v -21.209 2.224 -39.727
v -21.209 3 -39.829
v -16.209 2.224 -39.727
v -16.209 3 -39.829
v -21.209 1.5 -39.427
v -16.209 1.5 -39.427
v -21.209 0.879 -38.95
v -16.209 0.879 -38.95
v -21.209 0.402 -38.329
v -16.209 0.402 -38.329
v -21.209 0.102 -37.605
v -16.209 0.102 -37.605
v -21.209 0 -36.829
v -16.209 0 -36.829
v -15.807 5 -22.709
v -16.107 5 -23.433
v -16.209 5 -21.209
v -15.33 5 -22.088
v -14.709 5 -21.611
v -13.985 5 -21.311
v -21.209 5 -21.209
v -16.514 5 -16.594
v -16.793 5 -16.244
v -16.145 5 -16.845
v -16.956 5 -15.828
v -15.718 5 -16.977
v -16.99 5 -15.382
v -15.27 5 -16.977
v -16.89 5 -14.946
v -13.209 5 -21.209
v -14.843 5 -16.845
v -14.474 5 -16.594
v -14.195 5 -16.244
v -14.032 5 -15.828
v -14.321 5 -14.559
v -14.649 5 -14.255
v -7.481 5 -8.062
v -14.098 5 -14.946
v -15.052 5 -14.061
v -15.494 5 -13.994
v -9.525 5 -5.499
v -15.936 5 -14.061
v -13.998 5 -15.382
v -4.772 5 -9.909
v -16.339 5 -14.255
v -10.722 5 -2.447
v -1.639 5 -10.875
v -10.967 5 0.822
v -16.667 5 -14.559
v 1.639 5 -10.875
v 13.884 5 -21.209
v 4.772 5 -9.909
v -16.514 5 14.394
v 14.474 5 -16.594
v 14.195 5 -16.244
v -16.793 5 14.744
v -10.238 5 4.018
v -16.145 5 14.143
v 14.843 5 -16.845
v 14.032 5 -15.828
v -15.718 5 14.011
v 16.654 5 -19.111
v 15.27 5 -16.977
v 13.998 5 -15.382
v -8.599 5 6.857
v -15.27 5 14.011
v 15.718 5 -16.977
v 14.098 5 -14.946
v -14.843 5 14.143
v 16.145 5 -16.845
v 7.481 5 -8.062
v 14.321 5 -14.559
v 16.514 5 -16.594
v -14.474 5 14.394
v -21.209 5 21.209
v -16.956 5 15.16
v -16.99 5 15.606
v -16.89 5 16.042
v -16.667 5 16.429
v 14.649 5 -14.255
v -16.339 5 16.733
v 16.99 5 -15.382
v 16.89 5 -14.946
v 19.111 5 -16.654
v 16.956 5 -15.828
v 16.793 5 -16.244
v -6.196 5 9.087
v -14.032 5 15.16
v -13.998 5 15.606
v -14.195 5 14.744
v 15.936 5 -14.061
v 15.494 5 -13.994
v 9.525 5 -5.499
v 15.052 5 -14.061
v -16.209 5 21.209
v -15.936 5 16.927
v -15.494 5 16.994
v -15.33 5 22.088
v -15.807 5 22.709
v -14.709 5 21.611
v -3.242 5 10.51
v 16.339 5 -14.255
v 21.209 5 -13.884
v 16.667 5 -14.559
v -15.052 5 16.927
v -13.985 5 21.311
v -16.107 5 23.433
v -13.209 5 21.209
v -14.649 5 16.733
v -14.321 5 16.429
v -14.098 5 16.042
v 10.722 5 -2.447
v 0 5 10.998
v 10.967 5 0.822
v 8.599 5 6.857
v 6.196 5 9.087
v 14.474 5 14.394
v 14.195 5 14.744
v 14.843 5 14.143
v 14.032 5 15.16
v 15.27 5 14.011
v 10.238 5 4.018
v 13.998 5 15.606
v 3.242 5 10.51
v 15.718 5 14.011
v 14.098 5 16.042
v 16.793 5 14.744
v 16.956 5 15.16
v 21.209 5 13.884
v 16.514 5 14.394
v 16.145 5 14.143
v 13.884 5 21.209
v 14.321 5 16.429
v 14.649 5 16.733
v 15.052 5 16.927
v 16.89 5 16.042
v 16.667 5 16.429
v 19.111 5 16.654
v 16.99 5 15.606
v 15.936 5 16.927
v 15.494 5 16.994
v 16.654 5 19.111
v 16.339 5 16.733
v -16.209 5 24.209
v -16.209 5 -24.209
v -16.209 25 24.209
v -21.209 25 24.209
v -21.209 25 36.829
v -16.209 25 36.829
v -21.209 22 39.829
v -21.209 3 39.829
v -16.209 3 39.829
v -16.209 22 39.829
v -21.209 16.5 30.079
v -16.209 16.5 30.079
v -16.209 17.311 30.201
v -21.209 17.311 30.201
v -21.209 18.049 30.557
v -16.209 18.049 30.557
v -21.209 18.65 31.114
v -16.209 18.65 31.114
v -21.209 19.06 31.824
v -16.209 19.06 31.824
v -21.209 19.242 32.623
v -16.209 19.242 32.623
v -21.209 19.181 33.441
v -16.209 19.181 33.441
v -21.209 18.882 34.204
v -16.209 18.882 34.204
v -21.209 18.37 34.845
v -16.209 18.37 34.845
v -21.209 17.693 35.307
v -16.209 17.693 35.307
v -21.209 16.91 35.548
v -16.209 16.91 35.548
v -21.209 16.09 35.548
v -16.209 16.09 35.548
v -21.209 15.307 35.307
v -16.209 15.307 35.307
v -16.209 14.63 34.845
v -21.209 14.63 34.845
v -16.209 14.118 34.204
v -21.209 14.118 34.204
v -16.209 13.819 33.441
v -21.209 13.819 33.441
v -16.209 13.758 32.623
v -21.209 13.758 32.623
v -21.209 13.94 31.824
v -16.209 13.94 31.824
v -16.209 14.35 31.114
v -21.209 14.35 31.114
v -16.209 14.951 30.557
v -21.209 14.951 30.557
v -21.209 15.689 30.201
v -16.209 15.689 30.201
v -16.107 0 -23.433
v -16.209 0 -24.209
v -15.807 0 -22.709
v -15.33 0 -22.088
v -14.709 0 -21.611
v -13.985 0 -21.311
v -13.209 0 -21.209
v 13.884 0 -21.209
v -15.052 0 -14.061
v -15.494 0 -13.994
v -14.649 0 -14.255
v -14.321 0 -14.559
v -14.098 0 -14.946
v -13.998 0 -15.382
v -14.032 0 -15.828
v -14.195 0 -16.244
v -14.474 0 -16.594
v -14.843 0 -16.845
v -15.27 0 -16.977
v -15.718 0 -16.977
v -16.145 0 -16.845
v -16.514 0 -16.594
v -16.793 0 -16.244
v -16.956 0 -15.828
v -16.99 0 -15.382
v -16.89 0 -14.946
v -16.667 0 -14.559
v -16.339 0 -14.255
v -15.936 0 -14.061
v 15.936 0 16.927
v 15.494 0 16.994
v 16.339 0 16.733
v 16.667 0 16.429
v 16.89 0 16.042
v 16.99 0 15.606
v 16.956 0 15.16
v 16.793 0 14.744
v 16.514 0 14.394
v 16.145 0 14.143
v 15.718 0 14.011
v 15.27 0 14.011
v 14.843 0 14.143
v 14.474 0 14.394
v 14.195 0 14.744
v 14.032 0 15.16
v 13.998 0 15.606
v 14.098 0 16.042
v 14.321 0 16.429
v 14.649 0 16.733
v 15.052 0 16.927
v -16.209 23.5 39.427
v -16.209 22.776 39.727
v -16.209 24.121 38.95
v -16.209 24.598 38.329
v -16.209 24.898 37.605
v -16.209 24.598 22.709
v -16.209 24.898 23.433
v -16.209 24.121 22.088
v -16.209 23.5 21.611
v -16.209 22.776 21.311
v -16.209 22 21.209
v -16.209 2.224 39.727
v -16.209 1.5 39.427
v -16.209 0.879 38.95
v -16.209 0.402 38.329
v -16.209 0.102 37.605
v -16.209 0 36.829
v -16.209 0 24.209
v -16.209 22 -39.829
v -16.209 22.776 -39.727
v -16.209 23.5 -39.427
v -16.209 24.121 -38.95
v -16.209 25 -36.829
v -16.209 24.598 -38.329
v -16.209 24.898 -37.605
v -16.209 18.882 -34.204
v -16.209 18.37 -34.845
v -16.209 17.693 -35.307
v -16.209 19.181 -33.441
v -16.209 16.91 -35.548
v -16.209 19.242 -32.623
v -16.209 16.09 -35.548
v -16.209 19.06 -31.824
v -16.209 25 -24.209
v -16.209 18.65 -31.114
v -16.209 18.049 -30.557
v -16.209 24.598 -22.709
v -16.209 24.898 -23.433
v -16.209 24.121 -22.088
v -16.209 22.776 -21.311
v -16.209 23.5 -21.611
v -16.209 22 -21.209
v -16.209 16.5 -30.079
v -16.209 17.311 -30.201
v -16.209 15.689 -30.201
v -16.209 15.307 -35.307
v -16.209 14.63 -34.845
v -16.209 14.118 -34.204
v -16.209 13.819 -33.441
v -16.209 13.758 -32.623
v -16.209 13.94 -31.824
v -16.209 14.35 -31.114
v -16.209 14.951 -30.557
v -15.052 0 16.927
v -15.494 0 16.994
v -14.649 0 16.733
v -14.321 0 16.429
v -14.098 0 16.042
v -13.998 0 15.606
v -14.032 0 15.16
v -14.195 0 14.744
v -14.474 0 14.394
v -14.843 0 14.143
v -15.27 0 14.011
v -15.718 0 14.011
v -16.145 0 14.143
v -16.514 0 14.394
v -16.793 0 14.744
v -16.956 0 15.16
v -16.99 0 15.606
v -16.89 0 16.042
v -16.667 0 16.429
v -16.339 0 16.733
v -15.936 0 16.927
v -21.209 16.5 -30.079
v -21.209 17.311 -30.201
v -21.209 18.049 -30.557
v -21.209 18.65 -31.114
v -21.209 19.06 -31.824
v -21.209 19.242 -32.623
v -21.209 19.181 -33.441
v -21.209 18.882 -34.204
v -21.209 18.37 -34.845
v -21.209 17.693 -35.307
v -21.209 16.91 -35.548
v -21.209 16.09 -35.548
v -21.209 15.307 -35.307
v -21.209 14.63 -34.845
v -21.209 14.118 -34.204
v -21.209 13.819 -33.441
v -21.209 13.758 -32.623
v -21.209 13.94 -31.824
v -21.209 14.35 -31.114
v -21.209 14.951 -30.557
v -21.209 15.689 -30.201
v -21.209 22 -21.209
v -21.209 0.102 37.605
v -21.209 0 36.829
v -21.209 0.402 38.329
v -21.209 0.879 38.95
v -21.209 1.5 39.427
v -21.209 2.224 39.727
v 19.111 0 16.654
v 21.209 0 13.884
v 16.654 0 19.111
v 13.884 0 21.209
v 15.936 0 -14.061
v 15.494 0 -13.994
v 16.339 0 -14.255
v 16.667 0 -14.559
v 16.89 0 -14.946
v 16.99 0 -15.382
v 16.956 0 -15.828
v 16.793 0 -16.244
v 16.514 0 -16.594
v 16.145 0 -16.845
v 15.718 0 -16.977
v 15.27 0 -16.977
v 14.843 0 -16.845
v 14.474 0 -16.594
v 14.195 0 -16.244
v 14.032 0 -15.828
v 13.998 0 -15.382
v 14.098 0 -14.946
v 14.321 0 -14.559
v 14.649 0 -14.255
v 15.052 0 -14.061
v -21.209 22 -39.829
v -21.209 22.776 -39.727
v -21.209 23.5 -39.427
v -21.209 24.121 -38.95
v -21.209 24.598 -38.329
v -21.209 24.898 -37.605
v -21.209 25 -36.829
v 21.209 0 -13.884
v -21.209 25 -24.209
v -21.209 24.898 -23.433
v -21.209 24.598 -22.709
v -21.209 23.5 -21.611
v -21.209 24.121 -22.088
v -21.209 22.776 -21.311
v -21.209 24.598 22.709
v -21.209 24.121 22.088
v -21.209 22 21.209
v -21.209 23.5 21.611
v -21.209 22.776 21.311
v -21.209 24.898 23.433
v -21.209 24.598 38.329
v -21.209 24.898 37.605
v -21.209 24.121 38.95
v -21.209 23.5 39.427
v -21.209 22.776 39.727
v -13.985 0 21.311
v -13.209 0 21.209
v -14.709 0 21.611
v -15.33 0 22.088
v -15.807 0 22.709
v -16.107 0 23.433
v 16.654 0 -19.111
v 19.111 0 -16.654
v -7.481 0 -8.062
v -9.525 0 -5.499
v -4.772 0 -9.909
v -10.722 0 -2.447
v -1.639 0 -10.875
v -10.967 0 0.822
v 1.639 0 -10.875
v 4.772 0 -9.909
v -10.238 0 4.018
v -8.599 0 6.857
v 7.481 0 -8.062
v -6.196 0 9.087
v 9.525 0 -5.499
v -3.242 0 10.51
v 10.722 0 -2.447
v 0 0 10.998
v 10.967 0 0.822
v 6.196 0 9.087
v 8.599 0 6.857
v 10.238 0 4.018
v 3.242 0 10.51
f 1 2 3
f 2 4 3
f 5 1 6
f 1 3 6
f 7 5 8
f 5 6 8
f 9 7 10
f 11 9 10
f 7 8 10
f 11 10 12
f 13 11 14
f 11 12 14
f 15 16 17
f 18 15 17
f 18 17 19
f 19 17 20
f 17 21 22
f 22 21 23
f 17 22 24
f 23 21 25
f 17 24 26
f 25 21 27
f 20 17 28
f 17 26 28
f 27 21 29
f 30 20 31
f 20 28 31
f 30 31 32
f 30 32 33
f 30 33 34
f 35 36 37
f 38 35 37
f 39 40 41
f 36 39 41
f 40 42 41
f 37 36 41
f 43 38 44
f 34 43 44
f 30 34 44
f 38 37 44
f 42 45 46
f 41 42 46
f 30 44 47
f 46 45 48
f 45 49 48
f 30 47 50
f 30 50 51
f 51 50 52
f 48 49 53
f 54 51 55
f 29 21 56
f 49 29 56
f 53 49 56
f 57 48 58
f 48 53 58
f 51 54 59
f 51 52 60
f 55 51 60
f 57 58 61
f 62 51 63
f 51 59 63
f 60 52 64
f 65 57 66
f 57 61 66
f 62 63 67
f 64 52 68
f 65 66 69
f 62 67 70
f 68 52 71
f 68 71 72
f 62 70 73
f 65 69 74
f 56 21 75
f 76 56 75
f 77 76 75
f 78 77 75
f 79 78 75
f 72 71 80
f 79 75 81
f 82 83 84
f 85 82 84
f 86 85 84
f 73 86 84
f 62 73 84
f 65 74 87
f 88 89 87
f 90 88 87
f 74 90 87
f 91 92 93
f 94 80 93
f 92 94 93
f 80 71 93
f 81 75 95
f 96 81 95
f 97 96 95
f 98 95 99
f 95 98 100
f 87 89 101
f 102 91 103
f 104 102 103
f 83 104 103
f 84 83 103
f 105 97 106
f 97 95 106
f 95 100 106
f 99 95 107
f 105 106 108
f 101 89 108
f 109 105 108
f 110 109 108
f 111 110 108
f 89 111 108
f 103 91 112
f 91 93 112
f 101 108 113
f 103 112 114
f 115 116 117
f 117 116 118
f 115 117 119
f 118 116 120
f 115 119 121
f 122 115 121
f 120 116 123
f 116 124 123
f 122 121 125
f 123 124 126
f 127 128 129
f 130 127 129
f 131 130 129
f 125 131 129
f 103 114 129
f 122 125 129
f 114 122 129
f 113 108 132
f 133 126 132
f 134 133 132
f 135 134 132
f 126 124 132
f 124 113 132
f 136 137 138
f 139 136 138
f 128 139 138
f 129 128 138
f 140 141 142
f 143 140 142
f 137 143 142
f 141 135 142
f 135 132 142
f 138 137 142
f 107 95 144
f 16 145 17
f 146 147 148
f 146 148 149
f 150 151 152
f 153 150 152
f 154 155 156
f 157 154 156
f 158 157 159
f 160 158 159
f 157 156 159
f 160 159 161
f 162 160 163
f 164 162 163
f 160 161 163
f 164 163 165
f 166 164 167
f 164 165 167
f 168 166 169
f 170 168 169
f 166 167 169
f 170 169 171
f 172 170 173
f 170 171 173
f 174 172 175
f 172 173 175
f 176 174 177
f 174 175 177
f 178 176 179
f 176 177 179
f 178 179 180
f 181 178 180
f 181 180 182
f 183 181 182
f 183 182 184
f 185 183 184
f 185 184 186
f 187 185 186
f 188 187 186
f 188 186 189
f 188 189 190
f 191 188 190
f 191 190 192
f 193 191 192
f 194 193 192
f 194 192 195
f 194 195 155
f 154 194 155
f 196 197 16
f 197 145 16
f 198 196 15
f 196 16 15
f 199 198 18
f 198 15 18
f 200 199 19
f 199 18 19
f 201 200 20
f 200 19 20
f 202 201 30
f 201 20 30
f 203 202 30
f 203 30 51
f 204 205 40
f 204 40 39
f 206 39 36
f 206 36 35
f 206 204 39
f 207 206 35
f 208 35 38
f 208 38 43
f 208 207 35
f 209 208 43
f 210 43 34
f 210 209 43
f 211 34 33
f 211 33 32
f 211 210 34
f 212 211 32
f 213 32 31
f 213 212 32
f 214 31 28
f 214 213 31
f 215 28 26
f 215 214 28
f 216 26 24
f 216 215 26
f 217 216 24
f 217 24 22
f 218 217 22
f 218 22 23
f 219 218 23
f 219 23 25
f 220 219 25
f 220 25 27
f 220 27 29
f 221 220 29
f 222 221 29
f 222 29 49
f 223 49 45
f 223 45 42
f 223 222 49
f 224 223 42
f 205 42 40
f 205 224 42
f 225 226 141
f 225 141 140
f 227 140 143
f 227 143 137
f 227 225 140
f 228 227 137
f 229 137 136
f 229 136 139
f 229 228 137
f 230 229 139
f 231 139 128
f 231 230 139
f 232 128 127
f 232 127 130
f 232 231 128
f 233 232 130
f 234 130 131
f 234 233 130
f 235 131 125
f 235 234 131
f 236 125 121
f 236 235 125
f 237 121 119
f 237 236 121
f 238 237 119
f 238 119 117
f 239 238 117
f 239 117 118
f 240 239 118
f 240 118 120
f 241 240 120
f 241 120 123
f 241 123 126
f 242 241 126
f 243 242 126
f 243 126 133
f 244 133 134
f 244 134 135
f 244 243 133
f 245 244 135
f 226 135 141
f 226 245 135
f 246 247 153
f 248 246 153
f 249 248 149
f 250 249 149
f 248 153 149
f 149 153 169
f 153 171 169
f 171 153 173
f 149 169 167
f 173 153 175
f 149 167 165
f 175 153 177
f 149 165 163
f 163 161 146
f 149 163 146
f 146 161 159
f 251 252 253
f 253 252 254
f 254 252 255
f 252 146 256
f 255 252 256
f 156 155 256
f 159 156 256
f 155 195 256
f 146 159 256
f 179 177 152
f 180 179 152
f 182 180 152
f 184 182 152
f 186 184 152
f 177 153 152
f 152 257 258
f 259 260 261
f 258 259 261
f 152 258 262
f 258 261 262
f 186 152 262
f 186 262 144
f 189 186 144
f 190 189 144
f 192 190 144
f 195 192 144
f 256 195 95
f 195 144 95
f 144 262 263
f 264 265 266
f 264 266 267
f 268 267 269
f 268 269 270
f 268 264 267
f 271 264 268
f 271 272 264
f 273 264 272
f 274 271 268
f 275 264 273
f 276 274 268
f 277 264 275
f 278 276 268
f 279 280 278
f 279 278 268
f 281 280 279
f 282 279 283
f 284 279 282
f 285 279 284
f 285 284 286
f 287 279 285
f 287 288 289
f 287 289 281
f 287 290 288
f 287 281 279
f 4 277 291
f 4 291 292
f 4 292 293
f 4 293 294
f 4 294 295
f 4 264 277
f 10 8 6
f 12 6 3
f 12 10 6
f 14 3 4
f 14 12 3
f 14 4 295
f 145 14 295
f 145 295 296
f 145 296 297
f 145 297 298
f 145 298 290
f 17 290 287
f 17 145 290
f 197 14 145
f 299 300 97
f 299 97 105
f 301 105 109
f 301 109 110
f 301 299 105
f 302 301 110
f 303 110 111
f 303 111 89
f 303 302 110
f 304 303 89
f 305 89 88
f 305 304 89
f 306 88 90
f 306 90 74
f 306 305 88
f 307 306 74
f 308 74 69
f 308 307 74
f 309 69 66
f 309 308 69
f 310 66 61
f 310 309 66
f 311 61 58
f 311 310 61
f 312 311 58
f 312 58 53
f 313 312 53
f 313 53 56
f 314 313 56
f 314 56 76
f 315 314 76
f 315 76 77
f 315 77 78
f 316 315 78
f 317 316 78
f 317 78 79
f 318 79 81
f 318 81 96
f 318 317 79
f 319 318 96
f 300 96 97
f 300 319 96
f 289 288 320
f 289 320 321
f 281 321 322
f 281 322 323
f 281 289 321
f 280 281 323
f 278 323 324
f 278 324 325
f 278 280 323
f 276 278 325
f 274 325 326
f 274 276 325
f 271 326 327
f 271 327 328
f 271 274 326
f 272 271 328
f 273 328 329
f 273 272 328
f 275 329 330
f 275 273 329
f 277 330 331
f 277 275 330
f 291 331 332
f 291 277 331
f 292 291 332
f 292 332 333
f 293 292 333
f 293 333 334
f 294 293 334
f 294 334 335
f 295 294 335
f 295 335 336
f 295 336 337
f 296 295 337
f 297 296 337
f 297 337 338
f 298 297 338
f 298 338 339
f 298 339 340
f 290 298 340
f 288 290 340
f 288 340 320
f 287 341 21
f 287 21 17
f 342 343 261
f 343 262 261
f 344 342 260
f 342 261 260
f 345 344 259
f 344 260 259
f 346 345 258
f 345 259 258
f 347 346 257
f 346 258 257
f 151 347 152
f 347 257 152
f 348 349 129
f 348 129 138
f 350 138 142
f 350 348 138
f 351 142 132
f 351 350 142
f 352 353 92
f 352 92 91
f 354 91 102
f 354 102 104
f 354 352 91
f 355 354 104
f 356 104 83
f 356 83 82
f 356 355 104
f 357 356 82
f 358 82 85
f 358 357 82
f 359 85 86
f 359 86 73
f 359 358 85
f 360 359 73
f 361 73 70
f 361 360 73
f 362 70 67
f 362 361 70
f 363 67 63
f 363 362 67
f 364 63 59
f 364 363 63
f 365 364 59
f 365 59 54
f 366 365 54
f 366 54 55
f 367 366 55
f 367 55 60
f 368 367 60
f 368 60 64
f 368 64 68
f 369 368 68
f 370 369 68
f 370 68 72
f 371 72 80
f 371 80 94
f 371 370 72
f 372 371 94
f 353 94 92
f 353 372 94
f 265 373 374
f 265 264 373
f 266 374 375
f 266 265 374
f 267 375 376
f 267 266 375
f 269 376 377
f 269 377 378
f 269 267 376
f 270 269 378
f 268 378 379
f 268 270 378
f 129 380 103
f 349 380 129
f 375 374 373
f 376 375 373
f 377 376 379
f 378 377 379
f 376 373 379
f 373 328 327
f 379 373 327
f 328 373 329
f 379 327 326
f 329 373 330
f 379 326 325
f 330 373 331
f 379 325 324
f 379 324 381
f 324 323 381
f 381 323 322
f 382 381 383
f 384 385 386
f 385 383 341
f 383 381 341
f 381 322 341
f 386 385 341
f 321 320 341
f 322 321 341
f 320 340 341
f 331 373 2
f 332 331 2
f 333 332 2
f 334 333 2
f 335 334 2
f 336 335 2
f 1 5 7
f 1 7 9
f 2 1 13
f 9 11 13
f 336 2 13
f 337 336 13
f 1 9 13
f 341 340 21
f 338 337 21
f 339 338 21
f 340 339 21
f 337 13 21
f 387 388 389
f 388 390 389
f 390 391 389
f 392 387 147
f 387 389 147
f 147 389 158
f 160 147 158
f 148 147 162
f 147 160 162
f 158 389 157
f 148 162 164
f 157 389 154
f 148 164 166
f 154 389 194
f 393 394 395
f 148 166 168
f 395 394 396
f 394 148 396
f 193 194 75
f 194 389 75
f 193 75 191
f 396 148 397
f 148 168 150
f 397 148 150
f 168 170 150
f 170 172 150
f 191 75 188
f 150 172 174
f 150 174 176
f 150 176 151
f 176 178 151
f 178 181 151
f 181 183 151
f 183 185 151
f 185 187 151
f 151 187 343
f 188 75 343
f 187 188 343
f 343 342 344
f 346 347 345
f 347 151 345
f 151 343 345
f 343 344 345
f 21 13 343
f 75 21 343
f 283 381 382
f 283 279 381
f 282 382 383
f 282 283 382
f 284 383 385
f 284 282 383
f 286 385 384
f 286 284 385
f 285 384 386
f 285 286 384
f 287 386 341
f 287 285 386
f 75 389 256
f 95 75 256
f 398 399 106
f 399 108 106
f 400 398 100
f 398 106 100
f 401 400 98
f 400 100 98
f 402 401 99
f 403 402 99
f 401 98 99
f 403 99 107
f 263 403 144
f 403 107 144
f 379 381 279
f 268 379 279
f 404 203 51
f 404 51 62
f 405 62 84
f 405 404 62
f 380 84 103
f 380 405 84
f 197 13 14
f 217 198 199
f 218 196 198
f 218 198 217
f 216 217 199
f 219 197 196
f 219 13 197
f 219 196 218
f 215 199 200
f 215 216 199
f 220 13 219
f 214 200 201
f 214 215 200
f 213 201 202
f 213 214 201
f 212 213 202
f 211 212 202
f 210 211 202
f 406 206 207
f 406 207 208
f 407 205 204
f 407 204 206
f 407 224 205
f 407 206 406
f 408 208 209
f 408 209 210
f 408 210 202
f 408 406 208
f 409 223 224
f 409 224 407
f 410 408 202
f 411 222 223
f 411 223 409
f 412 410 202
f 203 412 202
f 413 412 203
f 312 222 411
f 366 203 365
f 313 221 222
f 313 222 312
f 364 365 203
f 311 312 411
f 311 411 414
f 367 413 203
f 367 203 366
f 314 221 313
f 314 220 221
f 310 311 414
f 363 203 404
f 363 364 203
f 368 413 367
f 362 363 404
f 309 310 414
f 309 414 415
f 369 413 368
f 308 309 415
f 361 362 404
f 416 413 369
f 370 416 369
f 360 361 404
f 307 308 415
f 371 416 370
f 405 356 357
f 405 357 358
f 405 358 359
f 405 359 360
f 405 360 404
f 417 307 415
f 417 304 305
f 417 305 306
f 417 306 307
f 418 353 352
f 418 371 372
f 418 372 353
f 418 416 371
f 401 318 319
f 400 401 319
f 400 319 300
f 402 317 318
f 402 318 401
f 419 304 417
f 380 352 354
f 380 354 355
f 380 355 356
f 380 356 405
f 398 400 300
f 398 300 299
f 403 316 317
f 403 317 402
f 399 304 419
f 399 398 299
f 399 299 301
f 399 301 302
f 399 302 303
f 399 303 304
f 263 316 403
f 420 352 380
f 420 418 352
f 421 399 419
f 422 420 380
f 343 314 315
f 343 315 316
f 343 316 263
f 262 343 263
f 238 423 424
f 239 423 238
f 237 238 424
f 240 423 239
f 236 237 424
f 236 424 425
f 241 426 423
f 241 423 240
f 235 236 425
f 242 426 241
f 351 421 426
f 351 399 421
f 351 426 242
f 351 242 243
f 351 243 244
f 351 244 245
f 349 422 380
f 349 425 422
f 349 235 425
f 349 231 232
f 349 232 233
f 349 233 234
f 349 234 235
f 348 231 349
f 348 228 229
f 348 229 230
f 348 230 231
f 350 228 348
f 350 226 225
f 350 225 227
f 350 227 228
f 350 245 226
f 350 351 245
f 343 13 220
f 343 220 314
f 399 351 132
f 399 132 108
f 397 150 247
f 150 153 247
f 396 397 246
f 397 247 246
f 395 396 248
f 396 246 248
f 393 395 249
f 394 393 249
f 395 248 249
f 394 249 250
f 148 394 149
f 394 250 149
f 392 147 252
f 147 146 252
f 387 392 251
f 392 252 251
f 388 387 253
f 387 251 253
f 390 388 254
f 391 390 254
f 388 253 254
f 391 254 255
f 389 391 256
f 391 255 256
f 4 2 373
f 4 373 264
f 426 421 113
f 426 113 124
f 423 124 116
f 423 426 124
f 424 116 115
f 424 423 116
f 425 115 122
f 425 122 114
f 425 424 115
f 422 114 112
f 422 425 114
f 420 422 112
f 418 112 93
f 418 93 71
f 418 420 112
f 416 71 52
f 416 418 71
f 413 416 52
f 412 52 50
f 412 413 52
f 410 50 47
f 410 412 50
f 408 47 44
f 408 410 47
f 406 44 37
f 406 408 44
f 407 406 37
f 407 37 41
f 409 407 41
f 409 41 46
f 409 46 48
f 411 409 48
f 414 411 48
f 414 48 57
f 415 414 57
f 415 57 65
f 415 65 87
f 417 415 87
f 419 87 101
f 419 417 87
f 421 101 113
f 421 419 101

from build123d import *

# Parameters (mm, degrees)
BOSS_EXTRUDE1_DEPTH = 5
SKETCH3_R           = 1.5
SKETCH3_R_2         = 10.9982
CUT_EXTRUDE1_DEPTH  = 5
SKETCH5_W           = 5
SKETCH5_H           = 5
BOSS_EXTRUDE2_DEPTH = 18.62
SKETCH6_W           = 5
SKETCH6_H           = 18.62
BOSS_EXTRUDE3_DEPTH = 20
CUT_EXTRUDE2_REACH  = 62.095
SKETCH7_R           = 2.75
FILLET1_R           = 3


with BuildPart() as part:
    # Sketch1 → Boss-Extrude1 (new body)
    with BuildSketch(Plane(origin=(0, 0, 0), x_dir=(1, 0, 0), z_dir=(0, 1, 0))):
        with BuildLine():
            Line((-13.883812864, -21.209), (-21.209, -21.209))
            Line((-21.209, -21.209), (-21.209, -13.883812864))
            Line((-21.209, -13.883812864), (-21.209, 13.883812864))
            Line((-21.209, 13.883812864), (-21.209, 21.209))
            Line((-21.209, 21.209), (-13.883812864, 21.209))
            Line((-13.883812864, 21.209), (13.883812864, 21.209))
            ThreePointArc((13.883812864, 21.209), (17.924591218, 17.924591218), (21.209, 13.883812864))
            Line((21.209, 13.883812864), (21.209, -13.883812864))
            ThreePointArc((21.209, -13.883812864), (17.924591218, -17.924591218), (13.883812864, -21.209))
            Line((13.883812864, -21.209), (-13.883812864, -21.209))
        make_face()
    extrude(amount=BOSS_EXTRUDE1_DEPTH)

    # Sketch3 → Cut-Extrude1 (cut)
    with BuildSketch(Plane(origin=(0, 0, 0), x_dir=(1, 0, 0), z_dir=(0, 1, 0))):
        with Locations(Location((15.494, -15.494, 0), (0, 0, 270))):
            Circle(SKETCH3_R)
        with Locations(Location((15.494, 15.494, 0), (0, 0, 270))):
            Circle(SKETCH3_R)
        with Locations(Location((-15.494, -15.494, 0), (0, 0, 270))):
            Circle(SKETCH3_R)
        with Locations(Location((-15.494, 15.494, 0), (0, 0, 270))):
            Circle(SKETCH3_R)
        with Locations(Location((0, 0, 0), (0, 0, 270))):
            Circle(SKETCH3_R_2)
    extrude(amount=CUT_EXTRUDE1_DEPTH, mode=Mode.SUBTRACT)

    # Sketch5 → Boss-Extrude2 (add)
    with BuildSketch(Plane.XY.offset(21.209)):
        with Locations((-18.709, 2.5)):
            Rectangle(SKETCH5_W, SKETCH5_H)
    boss_extrude2 = extrude(amount=BOSS_EXTRUDE2_DEPTH)

    # Sketch6 → Boss-Extrude3 (add)
    with BuildSketch(Plane(origin=(0, 5, 0), x_dir=(1, 0, 0), z_dir=(0, 1, 0))):
        with Locations((-18.709, -30.519)):
            Rectangle(SKETCH6_W, SKETCH6_H)
    boss_extrude3 = extrude(amount=BOSS_EXTRUDE3_DEPTH)

    # Sketch7 → Cut-Extrude2 (cut, up to next)
    with BuildSketch(Plane(origin=(-16.209, 0, 0), x_dir=(0, 0, -1), z_dir=(1, 0, 0)), mode=Mode.PRIVATE) as cut_extrude2_sk1:
        with Locations((-32.829, 16.5)):
            Circle(SKETCH7_R)
    cut_extrude2_tool1 = extrude(cut_extrude2_sk1.sketch, amount=-CUT_EXTRUDE2_REACH, mode=Mode.PRIVATE) & part.part
    cut_extrude2 = cut_extrude2_tool1.solids().sort_by_distance((-16.209, 16.5, 32.829))[0]
    add(cut_extrude2, mode=Mode.SUBTRACT)

    # Mirror3: Boss-Extrude2, Boss-Extrude3, Cut-Extrude2 across plane
    add(boss_extrude2.mirror(Plane(origin=(0, 0, 0), x_dir=(1, 0, 0), z_dir=(0, 0, -1))))
    add(boss_extrude3.mirror(Plane(origin=(0, 0, 0), x_dir=(1, 0, 0), z_dir=(0, 0, -1))))
    add(cut_extrude2.mirror(Plane(origin=(0, 0, 0), x_dir=(1, 0, 0), z_dir=(0, 0, -1))), mode=Mode.SUBTRACT)

    # Fillet1
    fillet1_edges = [part.edges().sort_by_distance(p)[0] for p in [
        (-16.209, 2.5, 21.209),
        (-18.709, 0, 39.829),
        (-18.709, 0, -39.829),
        (-18.709, 25, 39.829),
        (-18.709, 25, -39.829),
        (-16.209, 2.5, -21.209),
        (-18.709, 25, -21.209),
        (-18.709, 25, 21.209),
    ]]
    fillet(fillet1_edges, radius=FILLET1_R)


solid = part.part
